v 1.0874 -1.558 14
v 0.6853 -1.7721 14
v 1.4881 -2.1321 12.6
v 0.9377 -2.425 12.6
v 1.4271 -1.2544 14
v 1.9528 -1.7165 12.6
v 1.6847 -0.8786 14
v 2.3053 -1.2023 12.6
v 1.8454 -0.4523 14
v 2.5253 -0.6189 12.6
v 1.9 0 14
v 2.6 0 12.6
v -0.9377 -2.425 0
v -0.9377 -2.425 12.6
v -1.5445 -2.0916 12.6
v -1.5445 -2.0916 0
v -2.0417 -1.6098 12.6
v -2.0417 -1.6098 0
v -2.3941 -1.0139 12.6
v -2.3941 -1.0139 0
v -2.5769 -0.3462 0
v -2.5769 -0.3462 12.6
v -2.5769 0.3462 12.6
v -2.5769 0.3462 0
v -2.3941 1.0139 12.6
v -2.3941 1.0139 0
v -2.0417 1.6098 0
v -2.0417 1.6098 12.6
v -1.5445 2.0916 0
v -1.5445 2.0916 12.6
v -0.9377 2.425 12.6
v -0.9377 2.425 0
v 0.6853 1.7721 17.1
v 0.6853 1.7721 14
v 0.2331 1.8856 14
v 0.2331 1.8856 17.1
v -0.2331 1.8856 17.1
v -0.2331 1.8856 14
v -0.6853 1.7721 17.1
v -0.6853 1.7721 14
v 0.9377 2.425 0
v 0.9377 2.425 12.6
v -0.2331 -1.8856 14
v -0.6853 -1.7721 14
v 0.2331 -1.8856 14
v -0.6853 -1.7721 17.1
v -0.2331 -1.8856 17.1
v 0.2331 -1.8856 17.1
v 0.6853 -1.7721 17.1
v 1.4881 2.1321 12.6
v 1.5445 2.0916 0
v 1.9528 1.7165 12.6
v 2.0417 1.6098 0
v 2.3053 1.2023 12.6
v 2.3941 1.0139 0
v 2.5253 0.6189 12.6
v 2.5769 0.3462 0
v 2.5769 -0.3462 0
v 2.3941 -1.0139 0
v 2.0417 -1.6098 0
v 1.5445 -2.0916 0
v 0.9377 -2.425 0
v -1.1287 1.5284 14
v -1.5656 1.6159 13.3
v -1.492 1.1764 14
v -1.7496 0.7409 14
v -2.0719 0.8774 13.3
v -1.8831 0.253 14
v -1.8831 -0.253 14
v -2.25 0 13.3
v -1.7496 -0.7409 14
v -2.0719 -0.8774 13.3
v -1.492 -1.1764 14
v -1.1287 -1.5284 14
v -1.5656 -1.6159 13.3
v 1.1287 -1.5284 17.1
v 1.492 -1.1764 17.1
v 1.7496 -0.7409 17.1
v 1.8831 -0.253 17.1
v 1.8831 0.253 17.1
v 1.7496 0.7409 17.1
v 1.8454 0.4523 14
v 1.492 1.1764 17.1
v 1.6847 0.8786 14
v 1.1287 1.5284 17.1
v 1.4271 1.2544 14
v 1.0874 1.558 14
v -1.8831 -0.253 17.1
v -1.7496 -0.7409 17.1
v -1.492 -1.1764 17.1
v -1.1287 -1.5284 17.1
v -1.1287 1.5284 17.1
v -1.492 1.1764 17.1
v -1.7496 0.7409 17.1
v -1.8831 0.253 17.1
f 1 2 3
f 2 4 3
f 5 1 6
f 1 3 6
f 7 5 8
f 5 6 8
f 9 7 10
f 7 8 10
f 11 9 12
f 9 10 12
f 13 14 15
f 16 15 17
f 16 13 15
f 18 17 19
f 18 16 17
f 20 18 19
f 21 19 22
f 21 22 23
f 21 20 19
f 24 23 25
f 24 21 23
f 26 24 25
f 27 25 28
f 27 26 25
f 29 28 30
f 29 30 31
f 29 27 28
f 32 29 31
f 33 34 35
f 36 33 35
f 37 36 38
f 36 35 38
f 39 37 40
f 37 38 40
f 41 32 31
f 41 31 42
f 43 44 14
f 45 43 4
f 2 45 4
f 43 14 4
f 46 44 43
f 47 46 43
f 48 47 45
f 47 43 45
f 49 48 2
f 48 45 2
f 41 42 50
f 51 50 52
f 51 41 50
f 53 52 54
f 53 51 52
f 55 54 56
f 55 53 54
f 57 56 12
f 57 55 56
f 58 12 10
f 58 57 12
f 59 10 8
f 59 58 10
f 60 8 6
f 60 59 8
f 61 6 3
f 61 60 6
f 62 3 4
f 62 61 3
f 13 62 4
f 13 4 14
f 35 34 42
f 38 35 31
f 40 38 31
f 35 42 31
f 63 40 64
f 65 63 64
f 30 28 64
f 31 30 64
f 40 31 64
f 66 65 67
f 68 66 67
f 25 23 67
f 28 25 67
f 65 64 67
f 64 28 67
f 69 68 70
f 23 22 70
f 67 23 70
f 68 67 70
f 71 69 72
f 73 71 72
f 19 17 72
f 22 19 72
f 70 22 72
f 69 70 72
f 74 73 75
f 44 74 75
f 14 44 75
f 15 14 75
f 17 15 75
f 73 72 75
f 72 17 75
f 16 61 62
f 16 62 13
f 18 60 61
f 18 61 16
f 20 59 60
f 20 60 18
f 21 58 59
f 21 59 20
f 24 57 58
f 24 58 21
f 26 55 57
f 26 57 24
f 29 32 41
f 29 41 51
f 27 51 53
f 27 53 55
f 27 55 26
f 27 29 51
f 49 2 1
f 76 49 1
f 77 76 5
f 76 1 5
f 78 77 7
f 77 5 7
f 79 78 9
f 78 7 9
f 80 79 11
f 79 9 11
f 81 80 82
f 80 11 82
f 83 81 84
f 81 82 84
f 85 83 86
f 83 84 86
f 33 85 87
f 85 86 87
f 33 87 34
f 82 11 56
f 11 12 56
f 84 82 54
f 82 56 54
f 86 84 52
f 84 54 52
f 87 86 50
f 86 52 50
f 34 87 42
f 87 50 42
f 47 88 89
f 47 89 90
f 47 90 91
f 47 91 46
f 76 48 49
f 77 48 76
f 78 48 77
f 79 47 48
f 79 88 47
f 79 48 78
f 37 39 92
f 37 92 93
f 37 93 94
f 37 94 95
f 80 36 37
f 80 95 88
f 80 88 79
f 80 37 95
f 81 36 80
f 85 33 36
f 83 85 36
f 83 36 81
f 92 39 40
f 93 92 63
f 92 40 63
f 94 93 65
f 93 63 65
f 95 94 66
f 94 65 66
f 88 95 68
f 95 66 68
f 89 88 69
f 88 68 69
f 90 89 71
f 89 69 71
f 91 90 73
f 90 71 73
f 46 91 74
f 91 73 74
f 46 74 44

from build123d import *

# Parameters (mm, degrees)
BOSS_EXTRUDE1_DEPTH = 12.6
SKETCH2_R           = 1.9
BOSS_EXTRUDE2_DEPTH = 3.1


with BuildPart() as part:
    # Sketch1 → Boss-Extrude1 (new body)
    with BuildSketch(Plane.XY):
        with BuildLine():
            Line((-0.937749967, 2.425), (0.937749967, 2.425))
            ThreePointArc((0.937749967, 2.425), (2.6, 0), (0.937749967, -2.425))
            Line((0.937749967, -2.425), (-0.937749967, -2.425))
            ThreePointArc((-0.937749967, -2.425), (-2.6, 0), (-0.937749967, 2.425))
        make_face()
    extrude(amount=BOSS_EXTRUDE1_DEPTH)

    # Sketch2 → Loft1 section 0
    with BuildSketch(Plane.XY.offset(14)):
        Circle(SKETCH2_R)
    # Sketch3 → Loft1 section 1
    with BuildSketch(Plane.XY.offset(12.6)):
        with BuildLine():
            Line((-0.937749967, -2.425), (0.937749967, -2.425))
            ThreePointArc((0.937749967, -2.425), (2.6, 0), (0.937749967, 2.425))
            Line((0.937749967, 2.425), (-0.937749967, 2.425))
            ThreePointArc((-0.937749967, 2.425), (-2.6, 0), (-0.937749967, -2.425))
        make_face()
    loft()

    # Sketch4 → Boss-Extrude2 (add)
    with BuildSketch(Plane.XY.offset(14)):
        with BuildLine():
            ThreePointArc((0.685278822, 1.772115385), (0, 1.9), (-0.685278822, 1.772115385))
            ThreePointArc((-0.685278822, 1.772115385), (-1.9, 0), (-0.685278822, -1.772115385))
            ThreePointArc((-0.685278822, -1.772115385), (0, -1.9), (0.685278822, -1.772115385))
            ThreePointArc((0.685278822, -1.772115385), (1.9, 0), (0.685278822, 1.772115385))
        make_face()
    extrude(amount=BOSS_EXTRUDE2_DEPTH)


solid = part.part
